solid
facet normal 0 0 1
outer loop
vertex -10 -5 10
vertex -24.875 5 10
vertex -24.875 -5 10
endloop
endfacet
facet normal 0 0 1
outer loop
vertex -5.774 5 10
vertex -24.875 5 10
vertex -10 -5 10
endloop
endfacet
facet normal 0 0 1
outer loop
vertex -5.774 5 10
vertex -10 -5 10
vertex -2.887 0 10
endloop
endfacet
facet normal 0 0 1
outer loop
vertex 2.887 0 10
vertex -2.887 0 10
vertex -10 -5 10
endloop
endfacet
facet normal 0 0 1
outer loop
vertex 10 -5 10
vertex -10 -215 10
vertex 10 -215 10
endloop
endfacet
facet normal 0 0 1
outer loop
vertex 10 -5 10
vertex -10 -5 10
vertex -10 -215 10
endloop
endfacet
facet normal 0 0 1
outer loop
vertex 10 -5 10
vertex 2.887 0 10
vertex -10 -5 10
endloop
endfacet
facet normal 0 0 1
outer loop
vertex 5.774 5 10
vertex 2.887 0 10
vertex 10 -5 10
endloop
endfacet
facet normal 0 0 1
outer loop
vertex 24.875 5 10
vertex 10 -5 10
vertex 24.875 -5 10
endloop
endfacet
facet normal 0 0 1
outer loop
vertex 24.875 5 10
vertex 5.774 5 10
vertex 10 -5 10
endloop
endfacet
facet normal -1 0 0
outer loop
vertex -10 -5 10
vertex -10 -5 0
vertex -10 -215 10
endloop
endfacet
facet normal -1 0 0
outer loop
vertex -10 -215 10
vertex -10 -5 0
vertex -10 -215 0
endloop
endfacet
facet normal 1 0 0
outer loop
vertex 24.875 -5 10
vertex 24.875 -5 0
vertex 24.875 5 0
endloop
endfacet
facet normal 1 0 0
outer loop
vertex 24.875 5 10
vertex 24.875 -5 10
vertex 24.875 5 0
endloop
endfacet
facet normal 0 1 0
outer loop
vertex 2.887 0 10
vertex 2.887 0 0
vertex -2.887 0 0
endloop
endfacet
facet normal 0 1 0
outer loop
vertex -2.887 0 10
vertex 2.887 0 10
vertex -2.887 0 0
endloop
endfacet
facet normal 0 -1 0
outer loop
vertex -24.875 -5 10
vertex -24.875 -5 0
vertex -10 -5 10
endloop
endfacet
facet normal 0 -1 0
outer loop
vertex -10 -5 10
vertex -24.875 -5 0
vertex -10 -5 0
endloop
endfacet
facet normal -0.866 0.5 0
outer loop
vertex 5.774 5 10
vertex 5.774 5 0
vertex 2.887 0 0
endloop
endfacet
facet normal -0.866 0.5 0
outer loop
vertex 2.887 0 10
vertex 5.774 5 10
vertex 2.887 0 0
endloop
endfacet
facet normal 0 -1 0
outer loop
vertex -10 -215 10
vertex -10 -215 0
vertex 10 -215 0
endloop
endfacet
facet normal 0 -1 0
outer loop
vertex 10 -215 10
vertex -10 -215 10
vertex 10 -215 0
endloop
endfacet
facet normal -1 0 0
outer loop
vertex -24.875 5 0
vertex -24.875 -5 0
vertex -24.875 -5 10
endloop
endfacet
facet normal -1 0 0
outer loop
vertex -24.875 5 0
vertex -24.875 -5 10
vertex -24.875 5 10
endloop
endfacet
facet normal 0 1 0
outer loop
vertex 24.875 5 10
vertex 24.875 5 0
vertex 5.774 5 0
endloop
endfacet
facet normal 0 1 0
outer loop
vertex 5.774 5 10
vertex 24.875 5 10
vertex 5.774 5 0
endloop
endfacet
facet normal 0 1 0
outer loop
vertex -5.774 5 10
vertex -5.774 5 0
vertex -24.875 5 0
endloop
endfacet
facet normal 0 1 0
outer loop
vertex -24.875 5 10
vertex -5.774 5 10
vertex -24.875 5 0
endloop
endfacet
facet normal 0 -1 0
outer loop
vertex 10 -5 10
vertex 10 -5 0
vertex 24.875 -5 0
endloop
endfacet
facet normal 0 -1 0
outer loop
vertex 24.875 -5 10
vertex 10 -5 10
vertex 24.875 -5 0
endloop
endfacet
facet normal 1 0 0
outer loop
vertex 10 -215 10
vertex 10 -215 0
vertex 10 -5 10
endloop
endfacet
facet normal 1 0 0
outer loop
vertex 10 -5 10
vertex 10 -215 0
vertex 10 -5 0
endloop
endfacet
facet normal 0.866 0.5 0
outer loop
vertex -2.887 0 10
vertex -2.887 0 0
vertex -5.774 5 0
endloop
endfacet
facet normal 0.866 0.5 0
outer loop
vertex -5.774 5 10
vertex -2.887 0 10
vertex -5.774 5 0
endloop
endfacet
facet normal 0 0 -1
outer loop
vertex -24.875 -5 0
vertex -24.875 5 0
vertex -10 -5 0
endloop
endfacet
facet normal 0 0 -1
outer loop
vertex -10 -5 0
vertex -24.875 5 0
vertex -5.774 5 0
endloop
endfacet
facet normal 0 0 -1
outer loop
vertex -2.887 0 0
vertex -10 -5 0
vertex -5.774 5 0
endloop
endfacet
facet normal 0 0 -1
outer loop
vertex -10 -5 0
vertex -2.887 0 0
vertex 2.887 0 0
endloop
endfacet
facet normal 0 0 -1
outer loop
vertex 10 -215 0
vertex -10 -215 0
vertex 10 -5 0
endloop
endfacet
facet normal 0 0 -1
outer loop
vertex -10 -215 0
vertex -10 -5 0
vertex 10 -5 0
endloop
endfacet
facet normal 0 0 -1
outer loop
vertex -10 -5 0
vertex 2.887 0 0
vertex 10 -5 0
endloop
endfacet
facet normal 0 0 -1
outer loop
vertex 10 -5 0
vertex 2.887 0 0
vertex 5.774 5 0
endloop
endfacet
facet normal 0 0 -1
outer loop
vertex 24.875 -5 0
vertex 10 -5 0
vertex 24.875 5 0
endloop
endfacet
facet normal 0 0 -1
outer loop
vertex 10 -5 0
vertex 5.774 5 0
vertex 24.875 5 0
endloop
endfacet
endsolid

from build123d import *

# Parameters (mm, degrees)
SKETCH1_W           = 20
SKETCH1_H           = 200
SKETCH1_H_2         = 10
SKETCH1_W_2         = 14.875
BOSS_EXTRUDE1_DEPTH = 10


with BuildPart() as part:
    # Sketch1 → Boss-Extrude1 (new body)
    with BuildSketch(Plane.XY):
        with Locations((0, -115)):
            Rectangle(SKETCH1_W, SKETCH1_H)
        with Locations((0, -10)):
            Rectangle(SKETCH1_W, SKETCH1_H_2)
        Polygon((-10, 5), (-10, -5), (10, -5), (10, 5), (5.773502692, 5), (2.886751346, 0), (-2.886751346, 0), (-5.773502692, 5), align=None)
        with Locations((-17.4375, 0)):
            Rectangle(SKETCH1_W_2, SKETCH1_H_2)
        with Locations((17.4375, 0)):
            Rectangle(SKETCH1_W_2, SKETCH1_H_2)
    extrude(amount=BOSS_EXTRUDE1_DEPTH)


solid = part.part
